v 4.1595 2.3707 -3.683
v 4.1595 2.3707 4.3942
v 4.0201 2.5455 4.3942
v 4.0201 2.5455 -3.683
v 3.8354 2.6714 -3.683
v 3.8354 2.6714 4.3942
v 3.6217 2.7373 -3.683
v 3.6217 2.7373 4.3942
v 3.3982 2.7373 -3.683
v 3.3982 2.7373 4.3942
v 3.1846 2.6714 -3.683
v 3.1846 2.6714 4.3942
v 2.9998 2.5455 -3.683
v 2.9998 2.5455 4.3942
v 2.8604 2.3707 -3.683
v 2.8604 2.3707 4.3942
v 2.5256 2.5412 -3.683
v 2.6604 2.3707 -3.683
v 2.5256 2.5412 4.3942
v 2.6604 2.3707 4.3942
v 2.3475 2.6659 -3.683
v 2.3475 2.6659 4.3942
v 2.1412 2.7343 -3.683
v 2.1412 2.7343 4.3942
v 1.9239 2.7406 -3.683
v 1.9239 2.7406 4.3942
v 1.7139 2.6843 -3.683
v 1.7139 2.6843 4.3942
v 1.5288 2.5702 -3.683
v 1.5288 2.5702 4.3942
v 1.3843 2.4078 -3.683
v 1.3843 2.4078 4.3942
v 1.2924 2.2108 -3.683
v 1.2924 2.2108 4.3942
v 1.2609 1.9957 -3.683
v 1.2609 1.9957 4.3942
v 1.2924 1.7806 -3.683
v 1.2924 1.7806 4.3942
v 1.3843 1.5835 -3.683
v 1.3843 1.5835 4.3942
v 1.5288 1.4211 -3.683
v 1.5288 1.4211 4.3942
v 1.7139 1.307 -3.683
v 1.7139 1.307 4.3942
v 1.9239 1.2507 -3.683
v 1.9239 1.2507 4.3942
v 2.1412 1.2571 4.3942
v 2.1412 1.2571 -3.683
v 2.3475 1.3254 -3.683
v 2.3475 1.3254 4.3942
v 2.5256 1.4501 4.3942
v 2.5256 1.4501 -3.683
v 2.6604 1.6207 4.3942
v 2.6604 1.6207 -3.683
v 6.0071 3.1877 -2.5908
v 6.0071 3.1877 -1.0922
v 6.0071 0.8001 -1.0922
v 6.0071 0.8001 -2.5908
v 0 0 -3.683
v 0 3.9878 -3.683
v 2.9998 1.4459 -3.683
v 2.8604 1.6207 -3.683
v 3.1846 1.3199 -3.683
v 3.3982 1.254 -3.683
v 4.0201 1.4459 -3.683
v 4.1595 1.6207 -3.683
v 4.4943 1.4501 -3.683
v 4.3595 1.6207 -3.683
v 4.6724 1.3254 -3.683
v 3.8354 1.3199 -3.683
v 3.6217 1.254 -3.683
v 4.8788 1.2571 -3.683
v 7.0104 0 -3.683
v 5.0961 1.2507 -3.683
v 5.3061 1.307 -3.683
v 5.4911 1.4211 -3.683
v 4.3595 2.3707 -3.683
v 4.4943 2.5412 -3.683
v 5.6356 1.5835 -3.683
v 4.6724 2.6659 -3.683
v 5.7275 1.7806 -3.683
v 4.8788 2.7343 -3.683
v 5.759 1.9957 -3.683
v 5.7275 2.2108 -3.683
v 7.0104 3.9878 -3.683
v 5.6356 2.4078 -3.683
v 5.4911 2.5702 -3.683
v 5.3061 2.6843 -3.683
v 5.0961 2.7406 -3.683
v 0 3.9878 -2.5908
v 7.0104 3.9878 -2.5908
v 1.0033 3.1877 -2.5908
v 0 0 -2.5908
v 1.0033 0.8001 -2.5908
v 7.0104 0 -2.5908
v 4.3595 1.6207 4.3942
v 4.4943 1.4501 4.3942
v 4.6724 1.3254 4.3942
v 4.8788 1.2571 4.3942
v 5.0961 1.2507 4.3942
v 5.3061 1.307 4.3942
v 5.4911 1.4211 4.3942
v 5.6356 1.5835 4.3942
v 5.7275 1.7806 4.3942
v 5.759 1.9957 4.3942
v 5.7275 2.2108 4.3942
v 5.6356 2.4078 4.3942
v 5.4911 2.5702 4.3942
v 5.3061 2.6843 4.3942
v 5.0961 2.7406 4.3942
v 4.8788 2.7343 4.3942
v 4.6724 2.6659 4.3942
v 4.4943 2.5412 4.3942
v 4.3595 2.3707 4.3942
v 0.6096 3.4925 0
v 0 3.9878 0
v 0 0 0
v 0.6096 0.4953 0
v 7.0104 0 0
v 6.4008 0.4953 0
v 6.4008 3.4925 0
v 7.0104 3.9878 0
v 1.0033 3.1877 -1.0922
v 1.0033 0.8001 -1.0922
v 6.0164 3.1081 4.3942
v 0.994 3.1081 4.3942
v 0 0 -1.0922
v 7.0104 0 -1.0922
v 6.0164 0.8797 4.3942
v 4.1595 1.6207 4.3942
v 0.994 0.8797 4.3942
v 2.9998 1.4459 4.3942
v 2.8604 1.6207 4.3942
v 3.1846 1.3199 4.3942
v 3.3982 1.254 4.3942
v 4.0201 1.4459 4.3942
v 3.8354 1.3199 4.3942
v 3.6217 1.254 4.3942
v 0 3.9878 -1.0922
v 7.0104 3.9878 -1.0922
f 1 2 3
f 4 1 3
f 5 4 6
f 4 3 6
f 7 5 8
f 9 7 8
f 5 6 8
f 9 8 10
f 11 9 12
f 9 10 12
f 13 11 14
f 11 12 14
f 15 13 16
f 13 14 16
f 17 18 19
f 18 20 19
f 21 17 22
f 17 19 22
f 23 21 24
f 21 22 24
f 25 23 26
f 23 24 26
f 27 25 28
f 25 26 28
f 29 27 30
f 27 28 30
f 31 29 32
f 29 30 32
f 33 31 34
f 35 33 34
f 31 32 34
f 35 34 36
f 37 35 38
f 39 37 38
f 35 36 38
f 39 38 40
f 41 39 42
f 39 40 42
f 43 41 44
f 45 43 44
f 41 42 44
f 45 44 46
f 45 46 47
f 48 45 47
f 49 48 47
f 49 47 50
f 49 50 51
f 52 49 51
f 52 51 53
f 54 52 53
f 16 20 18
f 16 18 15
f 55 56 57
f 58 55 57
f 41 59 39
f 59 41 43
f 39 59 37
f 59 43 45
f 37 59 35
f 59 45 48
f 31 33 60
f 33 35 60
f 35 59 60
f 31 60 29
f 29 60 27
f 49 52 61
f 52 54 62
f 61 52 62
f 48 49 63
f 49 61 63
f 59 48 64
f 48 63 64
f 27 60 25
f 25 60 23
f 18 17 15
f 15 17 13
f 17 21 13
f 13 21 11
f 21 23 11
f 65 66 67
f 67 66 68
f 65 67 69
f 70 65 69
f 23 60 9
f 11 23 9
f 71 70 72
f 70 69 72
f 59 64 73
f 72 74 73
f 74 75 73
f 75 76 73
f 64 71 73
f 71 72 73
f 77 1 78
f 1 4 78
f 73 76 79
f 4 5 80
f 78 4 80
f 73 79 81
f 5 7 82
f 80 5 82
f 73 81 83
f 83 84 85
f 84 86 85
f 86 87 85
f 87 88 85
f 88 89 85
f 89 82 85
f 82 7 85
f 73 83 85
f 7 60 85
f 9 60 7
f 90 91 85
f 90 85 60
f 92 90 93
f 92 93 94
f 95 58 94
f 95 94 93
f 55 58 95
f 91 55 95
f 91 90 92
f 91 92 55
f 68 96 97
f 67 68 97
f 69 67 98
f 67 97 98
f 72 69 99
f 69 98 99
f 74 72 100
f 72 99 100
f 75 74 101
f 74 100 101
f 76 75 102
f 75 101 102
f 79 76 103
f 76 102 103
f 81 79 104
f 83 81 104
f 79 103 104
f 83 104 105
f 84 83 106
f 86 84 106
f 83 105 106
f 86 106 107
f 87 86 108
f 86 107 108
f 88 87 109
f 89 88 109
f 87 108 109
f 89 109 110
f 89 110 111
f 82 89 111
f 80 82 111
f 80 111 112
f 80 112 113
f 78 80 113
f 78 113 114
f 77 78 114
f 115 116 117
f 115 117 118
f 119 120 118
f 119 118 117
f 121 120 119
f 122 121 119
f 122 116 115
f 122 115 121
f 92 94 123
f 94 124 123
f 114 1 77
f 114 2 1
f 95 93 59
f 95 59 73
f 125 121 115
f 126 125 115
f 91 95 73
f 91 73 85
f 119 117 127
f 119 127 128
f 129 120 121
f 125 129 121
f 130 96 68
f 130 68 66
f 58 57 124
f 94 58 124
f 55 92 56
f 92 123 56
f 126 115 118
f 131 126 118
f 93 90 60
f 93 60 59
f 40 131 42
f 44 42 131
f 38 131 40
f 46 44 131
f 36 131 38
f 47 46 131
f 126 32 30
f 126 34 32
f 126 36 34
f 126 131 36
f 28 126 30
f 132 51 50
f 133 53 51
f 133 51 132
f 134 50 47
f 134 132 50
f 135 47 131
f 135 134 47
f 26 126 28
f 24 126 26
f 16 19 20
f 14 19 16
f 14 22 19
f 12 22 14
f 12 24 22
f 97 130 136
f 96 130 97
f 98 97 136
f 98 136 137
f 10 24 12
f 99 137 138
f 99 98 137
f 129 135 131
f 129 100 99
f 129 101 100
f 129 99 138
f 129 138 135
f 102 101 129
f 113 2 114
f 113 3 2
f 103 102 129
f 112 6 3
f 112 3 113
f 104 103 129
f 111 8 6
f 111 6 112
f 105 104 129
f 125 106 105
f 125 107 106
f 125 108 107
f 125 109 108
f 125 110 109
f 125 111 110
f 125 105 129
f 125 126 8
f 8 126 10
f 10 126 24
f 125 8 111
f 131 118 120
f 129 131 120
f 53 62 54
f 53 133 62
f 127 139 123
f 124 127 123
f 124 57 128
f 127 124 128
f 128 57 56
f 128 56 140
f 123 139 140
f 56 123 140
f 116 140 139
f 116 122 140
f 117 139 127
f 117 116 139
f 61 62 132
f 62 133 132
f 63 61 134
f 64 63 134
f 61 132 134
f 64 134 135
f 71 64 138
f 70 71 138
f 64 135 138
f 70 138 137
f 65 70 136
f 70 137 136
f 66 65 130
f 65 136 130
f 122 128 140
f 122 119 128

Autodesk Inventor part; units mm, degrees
ref_plane "YZ Plane" through (0, 0, 0) normal (1, 0, 0) x (0, 1, 0)
ref_plane "XZ Plane" through (0, 0, 0) normal (0, 1, 0) x (-1, 0, 0)
ref_plane "XY Plane" through (0, 0, 0) normal (0, 0, 1) x (1, 0, 0)
sketch "Sketch1" plane through (0, 0, 0) normal (0, 0, 1) x (1, 0, 0)
  line L0 (0, 0) -> (7.0104, 0)
  line L1 (7.0104, 0) -> (7.0104, 3.9878)
  line L2 (7.0104, 3.9878) -> (0, 3.9878)
  line L3 (0, 3.9878) -> (0, 0)
  dimension "d0" = 7.0104
  dimension "d1" = 3.9878
extrude "Extrusion1" add sketch "Sketch1" against normal blind 1.0922
sketch "Sketch2" plane through (0, 0, -1.0922) normal (0, 0, -1) x (-1, 0, 0)
  line L0 (-7.0104, 0) -> (-7.0104, 3.9878) projected
  line L1 (-7.0104, 3.9878) -> (0, 3.9878) projected
  line L2 (-6.0071, 0.8001) -> (-1.0033, 0.8001)
  line L3 (-1.0033, 0.8001) -> (-1.0033, 3.1877)
  line L4 (-1.0033, 3.1877) -> (-6.0071, 3.1877)
  line L5 (-6.0071, 3.1877) -> (-6.0071, 0.8001)
  point P0 (-3.5052, 3.1877)
  point P1 (-3.5052, 3.9878)
  point P2 (-6.0071, 1.9939)
  point P3 (-7.0104, 1.9939)
  dimension "d4" = 5.0038
  dimension "d5" = 2.3876
extrude "Extrusion2" add sketch "Sketch2" along normal blind 1.4986
pattern_linear "Rectangular Pattern1" count 2 spacing 2.5908 along (0, 0, -1) of "Extrusion1"
sketch "Sketch3" plane through (0, 0, 0) normal (0, 0, 1) x (1, 0, 0)
  line L0 (6.0071, 3.1877) -> (1.0033, 3.1877) projected
  line L1 (1.0033, 3.1877) -> (1.0033, 0.8001) projected
  line L2 (1.0033, 0.8001) -> (6.0071, 0.8001) projected
  line L3 (6.0071, 0.8001) -> (6.0071, 3.1877) projected
  line L4 (7.0104, 3.9878) -> (0, 3.9878) projected
  line L5 (0, 3.9878) -> (0, 0) projected
  line L6 (0.6096, 0.4953) -> (6.4008, 0.4953)
  line L7 (6.4008, 0.4953) -> (6.4008, 3.4925)
  line L8 (6.4008, 3.4925) -> (0.6096, 3.4925)
  line L9 (0.6096, 3.4925) -> (0.6096, 0.4953)
  point P0 (3.5052, 3.4925)
  point P1 (3.5052, 3.9878)
  point P2 (0.6096, 1.9939)
  point P3 (0, 1.9939)
  dimension "d14" = 5.7912
  dimension "d15" = 2.9972
sketch "Sketch3 outline for Extrusion3" plane through (0, 0, 0) normal (0, 0, 1) x (1, 0, 0)
  line L0 (0.6096, 3.4925) -> (0.6096, 0.4953)
  line L1 (6.4008, 3.4925) -> (0.6096, 3.4925)
  line L2 (6.4008, 0.4953) -> (6.4008, 3.4925)
  line L3 (0.6096, 0.4953) -> (6.4008, 0.4953)
extrude "Extrusion3" add sketch "Sketch3 outline for Extrusion3" along normal blind 4.3942 draft -5
sketch "Sketch4" plane through (0, 0, 4.3942) normal (0, 0, 1) x (1, 0, 0)
  line L0 (0.994043, 0.879743) -> (0.994043, 3.108057)
  line L1 (6.016357, 0.879743) -> (0.994043, 0.879743)
  line L2 (6.016357, 3.108057) -> (6.016357, 0.879743)
  line L3 (0.994043, 3.108057) -> (6.016357, 3.108057)
  line L4 (6.025892, 3.111592) -> (0.994043, 3.111592)
  line L5 (0.994043, 3.111592) -> (0.994043, 0.879743)
  line L6 (0.994043, 0.879743) -> (6.025892, 0.879743)
  line L7 (6.025892, 0.879743) -> (6.025892, 3.111592)
  line L8 (2.860448, 1.620667) -> (2.660448, 1.620667)
  arc A0 (2.660448, 2.370667) -> (2.660448, 1.620667) centre (2.010929, 1.995667) ccw
  line L9 (2.660448, 2.370667) -> (2.860448, 2.370667)
  arc A1 (4.159487, 2.370667) -> (2.860448, 2.370667) centre (3.509967, 1.995667) ccw
  line L10 (4.159487, 2.370667) -> (4.359487, 2.370667)
  arc A2 (4.359487, 1.620667) -> (4.359487, 2.370667) centre (5.009006, 1.995667) ccw
  line L11 (4.359487, 1.620667) -> (4.159487, 1.620667)
  arc A3 (2.860448, 1.620667) -> (4.159487, 1.620667) centre (3.509967, 1.995667) ccw
  point P0 (0, 0)
extrude "Extrusion4" cut sketch "Sketch4" against normal up to next contours L8 A0 L9 A1 L10 A2 L11 A3
properties part number "276-2154" material "Rubber"
